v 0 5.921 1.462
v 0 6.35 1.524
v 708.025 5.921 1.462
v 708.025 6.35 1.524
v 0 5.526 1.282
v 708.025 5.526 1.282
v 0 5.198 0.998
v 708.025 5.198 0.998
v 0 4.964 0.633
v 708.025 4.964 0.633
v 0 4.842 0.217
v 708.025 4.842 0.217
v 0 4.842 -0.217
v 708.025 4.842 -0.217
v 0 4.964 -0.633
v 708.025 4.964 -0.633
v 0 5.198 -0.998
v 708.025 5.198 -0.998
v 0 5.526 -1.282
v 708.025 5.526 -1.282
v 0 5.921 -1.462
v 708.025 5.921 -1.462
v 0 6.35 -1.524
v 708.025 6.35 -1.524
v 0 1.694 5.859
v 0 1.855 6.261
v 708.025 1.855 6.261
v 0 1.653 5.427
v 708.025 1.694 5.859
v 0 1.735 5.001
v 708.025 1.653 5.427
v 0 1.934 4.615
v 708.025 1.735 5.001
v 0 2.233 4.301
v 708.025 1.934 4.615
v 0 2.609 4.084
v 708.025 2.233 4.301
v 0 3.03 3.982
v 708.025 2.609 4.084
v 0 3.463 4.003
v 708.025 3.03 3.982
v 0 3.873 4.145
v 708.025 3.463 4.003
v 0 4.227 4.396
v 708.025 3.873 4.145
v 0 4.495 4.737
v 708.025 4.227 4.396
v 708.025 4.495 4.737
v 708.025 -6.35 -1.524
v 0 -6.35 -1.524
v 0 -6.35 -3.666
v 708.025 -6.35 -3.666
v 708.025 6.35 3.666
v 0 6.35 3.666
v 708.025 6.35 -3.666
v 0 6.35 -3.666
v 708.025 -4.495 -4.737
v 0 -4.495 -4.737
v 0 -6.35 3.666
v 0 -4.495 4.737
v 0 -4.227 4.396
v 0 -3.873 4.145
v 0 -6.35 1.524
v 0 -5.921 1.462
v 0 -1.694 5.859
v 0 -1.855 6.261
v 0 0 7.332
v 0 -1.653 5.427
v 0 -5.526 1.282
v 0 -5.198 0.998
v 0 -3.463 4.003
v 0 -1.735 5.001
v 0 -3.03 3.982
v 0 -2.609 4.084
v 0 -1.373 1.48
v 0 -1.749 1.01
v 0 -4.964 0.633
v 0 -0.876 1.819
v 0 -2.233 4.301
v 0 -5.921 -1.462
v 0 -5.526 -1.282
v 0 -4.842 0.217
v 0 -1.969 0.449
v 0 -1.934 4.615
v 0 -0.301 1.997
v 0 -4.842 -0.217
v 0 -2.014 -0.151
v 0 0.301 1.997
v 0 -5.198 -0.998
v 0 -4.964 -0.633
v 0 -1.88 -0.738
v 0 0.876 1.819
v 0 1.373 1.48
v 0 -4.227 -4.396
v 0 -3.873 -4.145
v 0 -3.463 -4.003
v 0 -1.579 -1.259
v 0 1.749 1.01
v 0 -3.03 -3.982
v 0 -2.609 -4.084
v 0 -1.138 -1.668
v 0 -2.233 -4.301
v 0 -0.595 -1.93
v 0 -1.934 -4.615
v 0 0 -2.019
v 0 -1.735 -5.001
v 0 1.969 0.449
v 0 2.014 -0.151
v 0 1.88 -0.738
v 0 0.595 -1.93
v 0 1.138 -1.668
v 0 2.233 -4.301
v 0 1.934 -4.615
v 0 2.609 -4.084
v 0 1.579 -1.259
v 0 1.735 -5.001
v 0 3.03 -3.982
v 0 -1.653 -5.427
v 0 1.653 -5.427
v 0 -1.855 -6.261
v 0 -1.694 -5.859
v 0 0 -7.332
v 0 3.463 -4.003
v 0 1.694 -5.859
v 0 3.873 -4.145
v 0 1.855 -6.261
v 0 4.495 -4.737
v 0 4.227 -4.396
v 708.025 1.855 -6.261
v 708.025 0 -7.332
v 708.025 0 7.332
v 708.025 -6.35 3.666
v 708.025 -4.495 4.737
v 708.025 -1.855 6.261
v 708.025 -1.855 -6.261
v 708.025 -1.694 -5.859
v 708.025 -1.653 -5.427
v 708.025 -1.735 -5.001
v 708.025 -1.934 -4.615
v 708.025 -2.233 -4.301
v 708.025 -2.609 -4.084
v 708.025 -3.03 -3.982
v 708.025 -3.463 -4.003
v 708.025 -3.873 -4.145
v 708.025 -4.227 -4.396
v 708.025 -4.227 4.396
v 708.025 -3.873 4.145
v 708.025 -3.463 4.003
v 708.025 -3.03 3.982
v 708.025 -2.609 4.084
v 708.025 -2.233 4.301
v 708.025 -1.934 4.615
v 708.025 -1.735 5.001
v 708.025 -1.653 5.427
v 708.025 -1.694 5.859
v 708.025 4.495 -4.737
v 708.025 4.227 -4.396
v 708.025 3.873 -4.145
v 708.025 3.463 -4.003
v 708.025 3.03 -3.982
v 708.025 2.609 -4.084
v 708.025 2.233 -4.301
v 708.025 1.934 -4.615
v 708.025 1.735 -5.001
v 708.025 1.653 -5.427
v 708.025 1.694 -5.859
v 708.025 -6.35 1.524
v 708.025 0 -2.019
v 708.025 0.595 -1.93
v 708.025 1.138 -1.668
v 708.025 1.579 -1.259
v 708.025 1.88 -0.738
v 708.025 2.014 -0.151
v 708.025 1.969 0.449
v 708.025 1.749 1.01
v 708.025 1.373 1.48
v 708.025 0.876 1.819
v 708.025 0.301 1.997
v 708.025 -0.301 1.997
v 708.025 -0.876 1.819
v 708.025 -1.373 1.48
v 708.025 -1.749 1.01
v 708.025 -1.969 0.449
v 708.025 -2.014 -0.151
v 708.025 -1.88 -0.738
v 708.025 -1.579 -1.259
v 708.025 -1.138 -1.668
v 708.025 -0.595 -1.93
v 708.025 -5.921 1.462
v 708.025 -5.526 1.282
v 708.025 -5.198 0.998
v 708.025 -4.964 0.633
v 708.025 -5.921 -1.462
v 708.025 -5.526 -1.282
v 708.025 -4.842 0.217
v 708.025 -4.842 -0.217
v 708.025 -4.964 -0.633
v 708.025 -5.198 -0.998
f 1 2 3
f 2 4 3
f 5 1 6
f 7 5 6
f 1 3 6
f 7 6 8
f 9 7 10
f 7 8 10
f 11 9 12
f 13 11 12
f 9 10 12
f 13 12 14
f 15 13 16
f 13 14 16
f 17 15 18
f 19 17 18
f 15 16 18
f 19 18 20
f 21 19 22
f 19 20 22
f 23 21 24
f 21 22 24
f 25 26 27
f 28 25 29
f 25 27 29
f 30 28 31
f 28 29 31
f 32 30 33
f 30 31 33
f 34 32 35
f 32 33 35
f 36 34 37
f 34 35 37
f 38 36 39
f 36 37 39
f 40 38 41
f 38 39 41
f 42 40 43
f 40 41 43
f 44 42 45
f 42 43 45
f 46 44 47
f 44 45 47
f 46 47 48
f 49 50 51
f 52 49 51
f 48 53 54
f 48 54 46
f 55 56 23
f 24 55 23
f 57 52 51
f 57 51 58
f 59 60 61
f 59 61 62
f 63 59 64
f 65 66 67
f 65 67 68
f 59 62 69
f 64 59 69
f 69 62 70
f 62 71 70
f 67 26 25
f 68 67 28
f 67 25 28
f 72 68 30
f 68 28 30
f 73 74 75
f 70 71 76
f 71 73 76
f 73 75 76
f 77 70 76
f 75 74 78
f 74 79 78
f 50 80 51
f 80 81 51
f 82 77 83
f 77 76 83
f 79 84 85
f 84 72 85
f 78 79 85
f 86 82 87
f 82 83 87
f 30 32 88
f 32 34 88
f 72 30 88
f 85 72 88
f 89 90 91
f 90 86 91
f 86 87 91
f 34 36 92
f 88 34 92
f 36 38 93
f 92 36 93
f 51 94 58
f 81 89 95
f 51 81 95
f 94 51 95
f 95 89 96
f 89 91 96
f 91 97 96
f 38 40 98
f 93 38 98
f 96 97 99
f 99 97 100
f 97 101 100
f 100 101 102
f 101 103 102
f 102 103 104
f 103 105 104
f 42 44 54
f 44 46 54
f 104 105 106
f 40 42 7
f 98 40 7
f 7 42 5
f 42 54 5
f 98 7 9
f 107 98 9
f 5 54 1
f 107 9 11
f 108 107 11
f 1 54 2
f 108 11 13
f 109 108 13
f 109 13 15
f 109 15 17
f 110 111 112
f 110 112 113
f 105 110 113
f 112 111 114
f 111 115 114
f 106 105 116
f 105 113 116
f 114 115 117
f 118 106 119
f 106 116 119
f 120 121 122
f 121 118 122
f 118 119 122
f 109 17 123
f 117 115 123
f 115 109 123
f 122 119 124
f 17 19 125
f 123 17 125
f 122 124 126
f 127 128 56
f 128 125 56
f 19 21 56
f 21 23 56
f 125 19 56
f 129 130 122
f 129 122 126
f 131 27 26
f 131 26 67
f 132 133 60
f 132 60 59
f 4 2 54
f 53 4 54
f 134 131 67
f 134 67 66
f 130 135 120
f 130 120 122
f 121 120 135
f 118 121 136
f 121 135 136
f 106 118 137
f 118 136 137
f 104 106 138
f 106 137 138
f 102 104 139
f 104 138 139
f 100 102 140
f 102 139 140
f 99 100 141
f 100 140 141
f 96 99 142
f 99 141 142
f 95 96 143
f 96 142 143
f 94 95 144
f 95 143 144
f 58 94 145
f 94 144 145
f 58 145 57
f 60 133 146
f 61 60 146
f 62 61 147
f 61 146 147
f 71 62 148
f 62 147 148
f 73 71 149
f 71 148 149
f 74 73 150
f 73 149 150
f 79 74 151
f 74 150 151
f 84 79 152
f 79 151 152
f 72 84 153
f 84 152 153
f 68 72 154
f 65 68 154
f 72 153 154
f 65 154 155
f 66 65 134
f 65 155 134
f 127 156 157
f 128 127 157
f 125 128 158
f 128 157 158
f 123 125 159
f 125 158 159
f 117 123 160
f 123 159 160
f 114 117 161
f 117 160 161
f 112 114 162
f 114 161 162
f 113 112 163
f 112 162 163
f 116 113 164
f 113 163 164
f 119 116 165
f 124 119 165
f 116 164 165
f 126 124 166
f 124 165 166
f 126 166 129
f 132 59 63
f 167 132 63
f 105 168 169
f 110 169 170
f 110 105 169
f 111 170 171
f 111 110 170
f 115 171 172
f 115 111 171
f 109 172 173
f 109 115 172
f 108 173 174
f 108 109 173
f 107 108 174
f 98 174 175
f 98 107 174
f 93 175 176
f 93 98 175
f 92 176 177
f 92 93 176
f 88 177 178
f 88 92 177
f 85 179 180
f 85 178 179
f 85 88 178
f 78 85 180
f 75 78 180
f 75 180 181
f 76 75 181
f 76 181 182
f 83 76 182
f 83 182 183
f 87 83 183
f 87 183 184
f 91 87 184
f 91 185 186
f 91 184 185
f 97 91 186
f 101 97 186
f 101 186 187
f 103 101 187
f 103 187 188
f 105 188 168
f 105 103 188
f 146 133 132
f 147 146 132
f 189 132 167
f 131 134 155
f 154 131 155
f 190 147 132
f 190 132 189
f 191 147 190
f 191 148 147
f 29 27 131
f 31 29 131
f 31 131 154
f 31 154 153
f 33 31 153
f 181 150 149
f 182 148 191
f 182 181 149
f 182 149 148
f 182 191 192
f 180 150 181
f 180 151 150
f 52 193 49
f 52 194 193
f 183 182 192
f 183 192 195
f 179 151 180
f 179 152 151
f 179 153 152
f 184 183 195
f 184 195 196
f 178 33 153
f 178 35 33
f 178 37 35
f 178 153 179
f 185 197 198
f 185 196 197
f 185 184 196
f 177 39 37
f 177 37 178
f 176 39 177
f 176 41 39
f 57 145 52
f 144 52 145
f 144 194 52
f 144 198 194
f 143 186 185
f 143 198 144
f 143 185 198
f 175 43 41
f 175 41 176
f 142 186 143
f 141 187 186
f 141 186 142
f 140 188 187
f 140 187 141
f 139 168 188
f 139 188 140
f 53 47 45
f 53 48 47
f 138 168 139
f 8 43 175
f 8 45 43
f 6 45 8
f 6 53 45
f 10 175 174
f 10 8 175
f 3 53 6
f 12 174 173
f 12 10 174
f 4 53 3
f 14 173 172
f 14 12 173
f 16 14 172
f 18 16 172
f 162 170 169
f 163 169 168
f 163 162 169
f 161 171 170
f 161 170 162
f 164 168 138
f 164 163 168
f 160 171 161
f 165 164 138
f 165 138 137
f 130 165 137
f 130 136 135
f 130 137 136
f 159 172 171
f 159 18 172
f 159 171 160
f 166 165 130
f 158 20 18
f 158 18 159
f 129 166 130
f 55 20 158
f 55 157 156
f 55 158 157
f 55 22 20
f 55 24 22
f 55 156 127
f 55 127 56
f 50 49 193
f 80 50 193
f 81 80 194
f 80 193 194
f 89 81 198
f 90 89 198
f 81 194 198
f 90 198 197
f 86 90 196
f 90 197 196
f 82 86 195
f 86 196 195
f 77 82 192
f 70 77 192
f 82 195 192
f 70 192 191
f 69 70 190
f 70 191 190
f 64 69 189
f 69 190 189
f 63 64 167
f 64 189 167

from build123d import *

# Parameters (mm, degrees)
SKETCH1_R           = 2.0193
BOSS_EXTRUDE1_DEPTH = 714.375
SKETCH2_R           = 1.524
CUT_EXTRUDE1_DEPTH  = 715.440848817
SKETCH3_R           = 21.255995951
CUT_EXTRUDE2_DEPTH  = 6.35


with BuildPart() as part:
    # Sketch1 → Boss-Extrude1 (new body)
    with BuildSketch(Plane(origin=(0, 0, 0), x_dir=(0, 0, -1), z_dir=(1, 0, 0))):
        Polygon((7.332348419, 0), (3.666174209, 6.35), (-3.666174209, 6.35), (-7.332348419, 0), (-3.666174209, -6.35), (3.666174209, -6.35), align=None)
        Circle(SKETCH1_R, mode=Mode.SUBTRACT)
    extrude(amount=BOSS_EXTRUDE1_DEPTH)

    # Sketch2 → Cut-Extrude1 (cut, through all)
    with BuildSketch(Plane(origin=(714.375, 0, 0), x_dir=(0, 0, -1), z_dir=(1, 0, 0))):
        with Locations((0, 6.35)):
            Circle(SKETCH2_R)
        with Locations((5.499261314, 3.175)):
            Circle(SKETCH2_R)
        with Locations((5.499261314, -3.175)):
            Circle(SKETCH2_R)
        with Locations((0, -6.35)):
            Circle(SKETCH2_R)
        with Locations((-5.499261314, -3.175)):
            Circle(SKETCH2_R)
        with Locations((-5.499261314, 3.175)):
            Circle(SKETCH2_R)
    extrude(amount=-CUT_EXTRUDE1_DEPTH, mode=Mode.SUBTRACT)

    # Sketch3 → Cut-Extrude2 (cut)
    with BuildSketch(Plane(origin=(714.375, 0, 0), x_dir=(0, 0, -1), z_dir=(1, 0, 0))):
        Circle(SKETCH3_R)
    extrude(amount=-CUT_EXTRUDE2_DEPTH, mode=Mode.SUBTRACT)


solid = part.part
